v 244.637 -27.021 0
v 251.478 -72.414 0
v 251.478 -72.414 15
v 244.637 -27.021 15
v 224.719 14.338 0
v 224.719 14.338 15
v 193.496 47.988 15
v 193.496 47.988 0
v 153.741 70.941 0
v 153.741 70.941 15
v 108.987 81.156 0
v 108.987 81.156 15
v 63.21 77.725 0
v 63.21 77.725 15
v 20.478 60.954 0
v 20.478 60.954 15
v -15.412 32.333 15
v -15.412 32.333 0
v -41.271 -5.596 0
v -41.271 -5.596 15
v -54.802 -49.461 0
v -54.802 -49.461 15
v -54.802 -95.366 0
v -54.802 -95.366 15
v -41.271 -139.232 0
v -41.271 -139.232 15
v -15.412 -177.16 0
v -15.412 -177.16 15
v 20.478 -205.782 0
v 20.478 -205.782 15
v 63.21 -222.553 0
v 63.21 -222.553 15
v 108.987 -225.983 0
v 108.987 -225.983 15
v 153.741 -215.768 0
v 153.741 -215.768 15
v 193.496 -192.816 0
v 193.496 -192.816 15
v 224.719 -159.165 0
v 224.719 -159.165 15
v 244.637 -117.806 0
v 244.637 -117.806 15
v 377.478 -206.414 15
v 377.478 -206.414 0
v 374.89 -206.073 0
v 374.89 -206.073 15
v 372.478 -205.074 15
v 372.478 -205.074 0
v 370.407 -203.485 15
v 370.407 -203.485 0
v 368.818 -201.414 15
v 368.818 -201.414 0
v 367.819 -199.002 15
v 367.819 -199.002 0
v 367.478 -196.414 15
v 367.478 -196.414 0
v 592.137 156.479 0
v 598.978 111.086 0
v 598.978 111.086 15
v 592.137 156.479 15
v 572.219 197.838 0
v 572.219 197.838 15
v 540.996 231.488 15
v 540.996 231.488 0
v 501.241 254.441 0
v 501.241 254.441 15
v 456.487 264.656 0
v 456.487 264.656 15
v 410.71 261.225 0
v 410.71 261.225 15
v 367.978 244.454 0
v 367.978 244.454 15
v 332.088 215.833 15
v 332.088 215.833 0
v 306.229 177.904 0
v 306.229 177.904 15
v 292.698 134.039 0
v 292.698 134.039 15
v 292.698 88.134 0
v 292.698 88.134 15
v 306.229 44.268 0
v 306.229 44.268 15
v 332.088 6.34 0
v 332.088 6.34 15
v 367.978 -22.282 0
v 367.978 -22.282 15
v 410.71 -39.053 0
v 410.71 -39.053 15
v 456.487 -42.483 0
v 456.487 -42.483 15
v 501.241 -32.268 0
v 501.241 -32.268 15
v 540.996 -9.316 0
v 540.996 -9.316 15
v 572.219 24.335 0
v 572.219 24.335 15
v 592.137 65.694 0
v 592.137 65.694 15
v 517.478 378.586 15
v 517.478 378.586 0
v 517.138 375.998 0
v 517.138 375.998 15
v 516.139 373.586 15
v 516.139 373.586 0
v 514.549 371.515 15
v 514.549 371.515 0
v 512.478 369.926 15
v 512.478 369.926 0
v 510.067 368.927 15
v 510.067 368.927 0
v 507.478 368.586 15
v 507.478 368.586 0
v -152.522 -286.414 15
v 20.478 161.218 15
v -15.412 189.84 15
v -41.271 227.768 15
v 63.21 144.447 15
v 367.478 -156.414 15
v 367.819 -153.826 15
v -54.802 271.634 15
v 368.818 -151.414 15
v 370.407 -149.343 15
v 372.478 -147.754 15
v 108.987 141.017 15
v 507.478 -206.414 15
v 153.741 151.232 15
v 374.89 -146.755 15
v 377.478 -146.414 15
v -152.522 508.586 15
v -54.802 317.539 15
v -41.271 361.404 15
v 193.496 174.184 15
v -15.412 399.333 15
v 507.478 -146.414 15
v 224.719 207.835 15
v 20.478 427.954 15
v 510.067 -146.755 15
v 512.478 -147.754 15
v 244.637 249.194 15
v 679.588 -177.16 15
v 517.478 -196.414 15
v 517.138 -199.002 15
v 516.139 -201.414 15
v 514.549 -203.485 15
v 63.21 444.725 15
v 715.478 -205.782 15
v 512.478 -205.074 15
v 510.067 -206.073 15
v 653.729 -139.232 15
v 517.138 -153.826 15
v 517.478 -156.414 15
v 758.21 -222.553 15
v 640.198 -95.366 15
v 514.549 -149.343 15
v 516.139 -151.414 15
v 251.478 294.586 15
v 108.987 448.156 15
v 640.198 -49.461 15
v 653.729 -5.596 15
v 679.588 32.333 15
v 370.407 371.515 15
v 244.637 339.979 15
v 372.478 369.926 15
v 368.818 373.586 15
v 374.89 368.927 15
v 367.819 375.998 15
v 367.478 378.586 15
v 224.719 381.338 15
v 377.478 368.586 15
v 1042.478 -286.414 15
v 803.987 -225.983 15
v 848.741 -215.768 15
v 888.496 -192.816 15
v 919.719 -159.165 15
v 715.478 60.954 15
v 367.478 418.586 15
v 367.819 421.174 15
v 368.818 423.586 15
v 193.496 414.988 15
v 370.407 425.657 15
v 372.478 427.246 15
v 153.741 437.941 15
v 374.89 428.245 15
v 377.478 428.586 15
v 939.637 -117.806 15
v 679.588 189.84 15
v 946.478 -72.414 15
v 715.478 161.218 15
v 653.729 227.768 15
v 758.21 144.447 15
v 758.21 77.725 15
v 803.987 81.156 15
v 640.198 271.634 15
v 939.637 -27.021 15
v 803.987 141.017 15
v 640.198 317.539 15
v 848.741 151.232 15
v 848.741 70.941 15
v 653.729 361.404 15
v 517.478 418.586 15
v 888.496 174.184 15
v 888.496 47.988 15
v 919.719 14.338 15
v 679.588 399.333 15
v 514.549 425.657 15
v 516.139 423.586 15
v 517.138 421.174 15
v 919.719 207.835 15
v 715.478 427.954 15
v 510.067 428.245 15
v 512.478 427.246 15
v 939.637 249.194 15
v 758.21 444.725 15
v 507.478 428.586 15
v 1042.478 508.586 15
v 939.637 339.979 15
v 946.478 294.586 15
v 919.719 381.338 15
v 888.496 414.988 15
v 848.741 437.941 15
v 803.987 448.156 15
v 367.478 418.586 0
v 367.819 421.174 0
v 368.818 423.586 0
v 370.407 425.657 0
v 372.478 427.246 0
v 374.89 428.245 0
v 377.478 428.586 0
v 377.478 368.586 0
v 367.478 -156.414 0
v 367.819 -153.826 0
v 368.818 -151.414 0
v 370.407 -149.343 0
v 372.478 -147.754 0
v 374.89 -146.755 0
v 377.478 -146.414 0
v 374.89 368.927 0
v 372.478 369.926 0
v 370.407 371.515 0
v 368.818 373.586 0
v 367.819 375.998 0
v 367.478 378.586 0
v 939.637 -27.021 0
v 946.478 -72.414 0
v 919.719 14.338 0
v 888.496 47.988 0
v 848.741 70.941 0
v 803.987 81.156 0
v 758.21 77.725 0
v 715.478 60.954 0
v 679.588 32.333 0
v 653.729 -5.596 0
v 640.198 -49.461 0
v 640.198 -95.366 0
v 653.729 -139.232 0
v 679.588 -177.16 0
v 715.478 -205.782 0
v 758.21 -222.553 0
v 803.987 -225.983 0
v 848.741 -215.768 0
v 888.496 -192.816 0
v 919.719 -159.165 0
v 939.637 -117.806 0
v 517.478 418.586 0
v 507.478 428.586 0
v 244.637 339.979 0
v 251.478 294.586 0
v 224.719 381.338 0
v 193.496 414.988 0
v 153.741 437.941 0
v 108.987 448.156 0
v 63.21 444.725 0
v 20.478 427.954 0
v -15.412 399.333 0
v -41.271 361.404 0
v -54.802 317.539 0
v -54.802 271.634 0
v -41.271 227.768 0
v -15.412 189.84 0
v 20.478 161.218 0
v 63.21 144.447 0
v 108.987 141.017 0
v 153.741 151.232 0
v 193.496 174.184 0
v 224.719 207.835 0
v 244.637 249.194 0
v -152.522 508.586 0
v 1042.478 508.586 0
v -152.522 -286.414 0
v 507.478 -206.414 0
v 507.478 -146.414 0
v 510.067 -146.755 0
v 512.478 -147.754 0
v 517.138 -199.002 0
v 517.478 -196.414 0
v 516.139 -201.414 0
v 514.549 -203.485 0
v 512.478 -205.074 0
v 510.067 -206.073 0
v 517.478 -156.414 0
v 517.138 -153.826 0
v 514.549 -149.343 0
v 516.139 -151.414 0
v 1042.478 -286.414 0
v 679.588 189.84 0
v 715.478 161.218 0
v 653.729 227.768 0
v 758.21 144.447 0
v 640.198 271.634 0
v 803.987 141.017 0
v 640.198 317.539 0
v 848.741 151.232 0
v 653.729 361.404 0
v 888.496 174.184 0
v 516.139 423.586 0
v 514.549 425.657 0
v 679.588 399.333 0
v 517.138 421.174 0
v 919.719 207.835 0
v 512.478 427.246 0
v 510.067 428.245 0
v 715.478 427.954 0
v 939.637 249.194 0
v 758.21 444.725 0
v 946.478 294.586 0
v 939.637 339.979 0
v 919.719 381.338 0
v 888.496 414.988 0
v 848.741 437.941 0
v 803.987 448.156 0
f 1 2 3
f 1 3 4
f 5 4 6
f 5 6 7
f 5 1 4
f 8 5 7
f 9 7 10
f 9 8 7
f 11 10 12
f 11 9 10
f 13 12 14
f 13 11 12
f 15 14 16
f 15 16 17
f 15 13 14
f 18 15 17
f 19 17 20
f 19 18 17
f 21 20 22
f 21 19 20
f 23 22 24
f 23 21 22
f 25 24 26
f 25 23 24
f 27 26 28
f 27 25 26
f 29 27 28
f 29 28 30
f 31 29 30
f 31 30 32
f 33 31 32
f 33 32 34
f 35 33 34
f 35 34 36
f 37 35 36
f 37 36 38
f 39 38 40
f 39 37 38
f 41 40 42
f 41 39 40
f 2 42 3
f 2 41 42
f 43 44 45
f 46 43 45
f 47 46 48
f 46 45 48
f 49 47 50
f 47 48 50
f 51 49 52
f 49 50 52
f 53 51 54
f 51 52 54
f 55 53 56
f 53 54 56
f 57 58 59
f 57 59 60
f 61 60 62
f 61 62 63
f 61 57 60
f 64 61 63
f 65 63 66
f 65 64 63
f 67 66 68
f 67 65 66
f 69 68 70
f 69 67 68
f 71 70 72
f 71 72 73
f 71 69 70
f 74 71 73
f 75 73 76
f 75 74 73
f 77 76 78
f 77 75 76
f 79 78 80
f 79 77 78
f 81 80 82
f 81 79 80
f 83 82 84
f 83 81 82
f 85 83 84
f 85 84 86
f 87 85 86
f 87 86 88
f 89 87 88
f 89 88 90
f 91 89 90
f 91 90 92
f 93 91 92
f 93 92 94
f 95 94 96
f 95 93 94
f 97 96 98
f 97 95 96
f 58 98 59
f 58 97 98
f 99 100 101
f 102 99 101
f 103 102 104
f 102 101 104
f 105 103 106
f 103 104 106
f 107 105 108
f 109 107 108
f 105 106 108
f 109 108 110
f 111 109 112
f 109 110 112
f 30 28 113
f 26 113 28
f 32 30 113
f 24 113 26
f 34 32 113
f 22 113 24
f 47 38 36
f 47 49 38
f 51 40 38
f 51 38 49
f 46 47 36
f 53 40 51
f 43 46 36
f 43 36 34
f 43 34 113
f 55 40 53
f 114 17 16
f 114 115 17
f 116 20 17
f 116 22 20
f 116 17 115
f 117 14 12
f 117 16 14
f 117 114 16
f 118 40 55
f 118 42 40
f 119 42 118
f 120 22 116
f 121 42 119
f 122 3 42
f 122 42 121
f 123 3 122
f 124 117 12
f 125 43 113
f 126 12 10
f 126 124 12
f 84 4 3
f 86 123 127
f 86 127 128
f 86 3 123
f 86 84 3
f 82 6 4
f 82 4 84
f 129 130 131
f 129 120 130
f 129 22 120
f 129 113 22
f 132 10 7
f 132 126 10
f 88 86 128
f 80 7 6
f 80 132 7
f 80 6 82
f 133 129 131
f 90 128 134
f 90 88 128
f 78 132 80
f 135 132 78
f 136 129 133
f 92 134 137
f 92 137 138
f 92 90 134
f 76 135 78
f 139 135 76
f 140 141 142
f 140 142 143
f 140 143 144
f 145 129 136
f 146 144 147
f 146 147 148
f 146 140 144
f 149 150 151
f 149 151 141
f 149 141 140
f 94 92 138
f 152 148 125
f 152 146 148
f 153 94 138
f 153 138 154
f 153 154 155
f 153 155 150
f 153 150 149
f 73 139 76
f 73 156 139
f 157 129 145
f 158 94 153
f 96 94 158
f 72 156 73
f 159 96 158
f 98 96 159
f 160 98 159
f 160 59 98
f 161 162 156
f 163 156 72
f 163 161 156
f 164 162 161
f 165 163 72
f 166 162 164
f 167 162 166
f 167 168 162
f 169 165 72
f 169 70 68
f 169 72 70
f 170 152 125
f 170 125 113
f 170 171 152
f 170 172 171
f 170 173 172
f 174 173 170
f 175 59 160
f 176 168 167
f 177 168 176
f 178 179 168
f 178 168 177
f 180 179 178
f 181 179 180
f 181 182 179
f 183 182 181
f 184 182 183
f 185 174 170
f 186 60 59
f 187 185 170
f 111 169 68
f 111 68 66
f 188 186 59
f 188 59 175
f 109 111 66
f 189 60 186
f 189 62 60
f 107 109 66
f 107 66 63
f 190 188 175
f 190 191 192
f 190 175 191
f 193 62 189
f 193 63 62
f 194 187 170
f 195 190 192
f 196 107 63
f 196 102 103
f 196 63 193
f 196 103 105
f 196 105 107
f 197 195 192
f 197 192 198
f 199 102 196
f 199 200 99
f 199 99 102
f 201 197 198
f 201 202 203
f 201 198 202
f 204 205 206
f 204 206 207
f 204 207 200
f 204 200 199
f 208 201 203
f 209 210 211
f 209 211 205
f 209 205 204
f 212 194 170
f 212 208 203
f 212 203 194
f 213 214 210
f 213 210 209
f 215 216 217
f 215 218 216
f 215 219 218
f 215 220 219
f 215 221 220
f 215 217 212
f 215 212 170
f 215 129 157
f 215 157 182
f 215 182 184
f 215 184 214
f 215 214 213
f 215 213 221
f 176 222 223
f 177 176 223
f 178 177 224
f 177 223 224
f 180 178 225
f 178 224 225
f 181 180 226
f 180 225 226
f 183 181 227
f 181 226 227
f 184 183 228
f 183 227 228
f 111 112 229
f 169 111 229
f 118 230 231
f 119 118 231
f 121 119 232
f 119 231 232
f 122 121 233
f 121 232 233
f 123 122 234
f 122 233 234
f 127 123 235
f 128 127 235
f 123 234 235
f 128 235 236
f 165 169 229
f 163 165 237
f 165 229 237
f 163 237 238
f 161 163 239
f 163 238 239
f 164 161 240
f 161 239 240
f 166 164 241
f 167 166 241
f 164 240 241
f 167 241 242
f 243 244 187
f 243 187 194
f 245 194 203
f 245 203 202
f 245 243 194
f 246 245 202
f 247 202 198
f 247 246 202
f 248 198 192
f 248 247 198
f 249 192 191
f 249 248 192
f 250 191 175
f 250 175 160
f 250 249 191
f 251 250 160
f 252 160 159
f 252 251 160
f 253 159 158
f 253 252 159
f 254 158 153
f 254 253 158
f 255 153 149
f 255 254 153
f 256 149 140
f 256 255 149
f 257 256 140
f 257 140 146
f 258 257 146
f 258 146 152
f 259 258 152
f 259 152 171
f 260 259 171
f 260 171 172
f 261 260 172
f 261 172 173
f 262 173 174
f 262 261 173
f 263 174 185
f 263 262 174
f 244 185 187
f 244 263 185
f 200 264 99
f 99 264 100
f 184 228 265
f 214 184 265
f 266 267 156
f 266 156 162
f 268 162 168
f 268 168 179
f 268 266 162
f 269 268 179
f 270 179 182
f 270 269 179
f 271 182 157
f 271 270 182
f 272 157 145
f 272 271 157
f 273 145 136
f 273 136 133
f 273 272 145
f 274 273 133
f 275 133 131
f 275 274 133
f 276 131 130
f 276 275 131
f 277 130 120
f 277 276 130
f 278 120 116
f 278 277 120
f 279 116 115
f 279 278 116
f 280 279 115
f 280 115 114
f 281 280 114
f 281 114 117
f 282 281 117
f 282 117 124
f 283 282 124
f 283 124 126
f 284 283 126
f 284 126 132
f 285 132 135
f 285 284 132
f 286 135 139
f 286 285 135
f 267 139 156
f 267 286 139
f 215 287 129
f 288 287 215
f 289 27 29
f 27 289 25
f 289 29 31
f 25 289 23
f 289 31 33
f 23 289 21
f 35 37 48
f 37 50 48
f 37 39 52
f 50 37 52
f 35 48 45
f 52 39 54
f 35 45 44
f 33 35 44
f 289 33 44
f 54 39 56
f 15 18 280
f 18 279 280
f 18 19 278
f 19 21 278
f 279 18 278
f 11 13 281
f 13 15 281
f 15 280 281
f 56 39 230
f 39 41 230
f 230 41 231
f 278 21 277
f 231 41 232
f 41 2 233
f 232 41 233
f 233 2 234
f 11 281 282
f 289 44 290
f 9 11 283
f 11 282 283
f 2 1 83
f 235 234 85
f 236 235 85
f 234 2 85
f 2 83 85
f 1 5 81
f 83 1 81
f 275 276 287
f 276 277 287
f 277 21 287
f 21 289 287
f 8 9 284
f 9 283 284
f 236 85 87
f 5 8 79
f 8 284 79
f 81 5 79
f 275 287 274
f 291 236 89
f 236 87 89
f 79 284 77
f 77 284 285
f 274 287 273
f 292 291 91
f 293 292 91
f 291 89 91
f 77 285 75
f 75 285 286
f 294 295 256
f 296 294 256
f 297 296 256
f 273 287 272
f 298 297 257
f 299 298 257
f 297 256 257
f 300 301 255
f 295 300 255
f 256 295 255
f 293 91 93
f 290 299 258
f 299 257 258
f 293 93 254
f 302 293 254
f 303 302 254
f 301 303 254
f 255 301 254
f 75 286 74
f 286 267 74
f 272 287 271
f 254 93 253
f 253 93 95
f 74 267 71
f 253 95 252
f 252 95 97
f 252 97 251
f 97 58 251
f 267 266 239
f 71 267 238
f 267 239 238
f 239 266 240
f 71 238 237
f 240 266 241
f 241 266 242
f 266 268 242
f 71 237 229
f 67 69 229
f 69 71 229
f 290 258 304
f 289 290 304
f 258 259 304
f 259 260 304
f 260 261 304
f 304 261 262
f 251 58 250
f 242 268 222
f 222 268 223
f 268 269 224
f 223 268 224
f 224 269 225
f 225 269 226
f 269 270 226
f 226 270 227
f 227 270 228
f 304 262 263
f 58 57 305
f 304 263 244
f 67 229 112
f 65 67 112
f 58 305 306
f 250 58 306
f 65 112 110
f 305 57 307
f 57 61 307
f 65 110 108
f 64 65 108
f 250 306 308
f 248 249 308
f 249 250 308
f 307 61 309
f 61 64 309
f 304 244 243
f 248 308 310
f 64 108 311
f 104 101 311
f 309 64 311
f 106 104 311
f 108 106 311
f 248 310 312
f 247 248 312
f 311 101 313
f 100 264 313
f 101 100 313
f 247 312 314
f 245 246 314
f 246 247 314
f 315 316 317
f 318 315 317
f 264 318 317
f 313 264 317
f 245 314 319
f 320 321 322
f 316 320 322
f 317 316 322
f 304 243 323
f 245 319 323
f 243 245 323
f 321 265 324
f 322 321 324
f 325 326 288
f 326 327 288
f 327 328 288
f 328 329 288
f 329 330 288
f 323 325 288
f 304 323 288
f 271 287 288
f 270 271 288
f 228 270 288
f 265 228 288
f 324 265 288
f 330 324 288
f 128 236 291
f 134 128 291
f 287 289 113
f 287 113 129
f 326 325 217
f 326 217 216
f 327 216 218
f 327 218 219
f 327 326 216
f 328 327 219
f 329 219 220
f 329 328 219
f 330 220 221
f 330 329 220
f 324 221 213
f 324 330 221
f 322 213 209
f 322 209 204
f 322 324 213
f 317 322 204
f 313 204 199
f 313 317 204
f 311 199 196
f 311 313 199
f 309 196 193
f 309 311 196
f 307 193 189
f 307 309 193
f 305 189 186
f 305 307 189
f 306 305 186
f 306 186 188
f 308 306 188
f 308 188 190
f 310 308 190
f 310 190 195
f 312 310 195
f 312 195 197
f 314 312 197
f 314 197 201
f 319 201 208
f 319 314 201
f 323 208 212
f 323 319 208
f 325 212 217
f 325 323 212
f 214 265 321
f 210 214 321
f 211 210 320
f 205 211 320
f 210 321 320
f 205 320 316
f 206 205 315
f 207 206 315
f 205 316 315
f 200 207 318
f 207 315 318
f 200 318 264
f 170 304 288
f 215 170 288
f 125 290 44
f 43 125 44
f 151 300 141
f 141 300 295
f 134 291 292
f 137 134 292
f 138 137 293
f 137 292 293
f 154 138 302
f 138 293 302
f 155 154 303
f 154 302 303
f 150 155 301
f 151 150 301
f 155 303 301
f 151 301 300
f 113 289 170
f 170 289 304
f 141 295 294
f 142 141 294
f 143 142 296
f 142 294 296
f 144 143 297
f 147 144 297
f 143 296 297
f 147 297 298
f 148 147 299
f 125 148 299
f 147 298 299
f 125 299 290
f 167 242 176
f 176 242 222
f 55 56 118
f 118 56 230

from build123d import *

# Parameters (mm, degrees)
F0_W     = 1195
F0_H     = 795
F0_R     = 154
F1_DEPTH = 15


with BuildPart() as f1:
    # F0 (on Top) → F1 (new body)
    with BuildSketch(Plane.XY):
        with Locations((444.978323, 111.086236)):
            Rectangle(F0_W, F0_H)
        with BuildLine():
            ThreePointArc((367.478323, -156.413764), (370.407255, -149.342696), (377.478323, -146.413764))
            Line((377.478323, -146.413764), (507.478323, -146.413764))
            ThreePointArc((507.478323, -146.413764), (514.549391, -149.342696), (517.478323, -156.413764))
            Line((517.478323, -156.413764), (517.478323, -196.413764))
            ThreePointArc((517.478323, -196.413764), (514.549391, -203.484832), (507.478323, -206.413764))
            Line((507.478323, -206.413764), (377.478323, -206.413764))
            ThreePointArc((377.478323, -206.413764), (370.407255, -203.484832), (367.478323, -196.413764))
            Line((367.478323, -196.413764), (367.478323, -156.413764))
        make_face(mode=Mode.SUBTRACT)
        with Locations((97.478323, -72.413764)):
            Circle(F0_R, mode=Mode.SUBTRACT)
        with Locations((444.978323, 111.086236)):
            Circle(F0_R, mode=Mode.SUBTRACT)
        with Locations((792.478323, -72.413764)):
            Circle(F0_R, mode=Mode.SUBTRACT)
        with Locations((97.478323, 294.586236)):
            Circle(F0_R, mode=Mode.SUBTRACT)
        with BuildLine():
            ThreePointArc((367.478323, 418.586236), (370.407255, 425.657304), (377.478323, 428.586236))
            Line((377.478323, 428.586236), (507.478323, 428.586236))
            ThreePointArc((507.478323, 428.586236), (514.549391, 425.657304), (517.478323, 418.586236))
            Line((517.478323, 418.586236), (517.478323, 378.586236))
            ThreePointArc((517.478323, 378.586236), (514.549391, 371.515168), (507.478323, 368.586236))
            Line((507.478323, 368.586236), (377.478323, 368.586236))
            ThreePointArc((377.478323, 368.586236), (370.407255, 371.515168), (367.478323, 378.586236))
            Line((367.478323, 378.586236), (367.478323, 418.586236))
        make_face(mode=Mode.SUBTRACT)
        with Locations((792.478323, 294.586236)):
            Circle(F0_R, mode=Mode.SUBTRACT)
    extrude(amount=F1_DEPTH)


solid = f1.part
